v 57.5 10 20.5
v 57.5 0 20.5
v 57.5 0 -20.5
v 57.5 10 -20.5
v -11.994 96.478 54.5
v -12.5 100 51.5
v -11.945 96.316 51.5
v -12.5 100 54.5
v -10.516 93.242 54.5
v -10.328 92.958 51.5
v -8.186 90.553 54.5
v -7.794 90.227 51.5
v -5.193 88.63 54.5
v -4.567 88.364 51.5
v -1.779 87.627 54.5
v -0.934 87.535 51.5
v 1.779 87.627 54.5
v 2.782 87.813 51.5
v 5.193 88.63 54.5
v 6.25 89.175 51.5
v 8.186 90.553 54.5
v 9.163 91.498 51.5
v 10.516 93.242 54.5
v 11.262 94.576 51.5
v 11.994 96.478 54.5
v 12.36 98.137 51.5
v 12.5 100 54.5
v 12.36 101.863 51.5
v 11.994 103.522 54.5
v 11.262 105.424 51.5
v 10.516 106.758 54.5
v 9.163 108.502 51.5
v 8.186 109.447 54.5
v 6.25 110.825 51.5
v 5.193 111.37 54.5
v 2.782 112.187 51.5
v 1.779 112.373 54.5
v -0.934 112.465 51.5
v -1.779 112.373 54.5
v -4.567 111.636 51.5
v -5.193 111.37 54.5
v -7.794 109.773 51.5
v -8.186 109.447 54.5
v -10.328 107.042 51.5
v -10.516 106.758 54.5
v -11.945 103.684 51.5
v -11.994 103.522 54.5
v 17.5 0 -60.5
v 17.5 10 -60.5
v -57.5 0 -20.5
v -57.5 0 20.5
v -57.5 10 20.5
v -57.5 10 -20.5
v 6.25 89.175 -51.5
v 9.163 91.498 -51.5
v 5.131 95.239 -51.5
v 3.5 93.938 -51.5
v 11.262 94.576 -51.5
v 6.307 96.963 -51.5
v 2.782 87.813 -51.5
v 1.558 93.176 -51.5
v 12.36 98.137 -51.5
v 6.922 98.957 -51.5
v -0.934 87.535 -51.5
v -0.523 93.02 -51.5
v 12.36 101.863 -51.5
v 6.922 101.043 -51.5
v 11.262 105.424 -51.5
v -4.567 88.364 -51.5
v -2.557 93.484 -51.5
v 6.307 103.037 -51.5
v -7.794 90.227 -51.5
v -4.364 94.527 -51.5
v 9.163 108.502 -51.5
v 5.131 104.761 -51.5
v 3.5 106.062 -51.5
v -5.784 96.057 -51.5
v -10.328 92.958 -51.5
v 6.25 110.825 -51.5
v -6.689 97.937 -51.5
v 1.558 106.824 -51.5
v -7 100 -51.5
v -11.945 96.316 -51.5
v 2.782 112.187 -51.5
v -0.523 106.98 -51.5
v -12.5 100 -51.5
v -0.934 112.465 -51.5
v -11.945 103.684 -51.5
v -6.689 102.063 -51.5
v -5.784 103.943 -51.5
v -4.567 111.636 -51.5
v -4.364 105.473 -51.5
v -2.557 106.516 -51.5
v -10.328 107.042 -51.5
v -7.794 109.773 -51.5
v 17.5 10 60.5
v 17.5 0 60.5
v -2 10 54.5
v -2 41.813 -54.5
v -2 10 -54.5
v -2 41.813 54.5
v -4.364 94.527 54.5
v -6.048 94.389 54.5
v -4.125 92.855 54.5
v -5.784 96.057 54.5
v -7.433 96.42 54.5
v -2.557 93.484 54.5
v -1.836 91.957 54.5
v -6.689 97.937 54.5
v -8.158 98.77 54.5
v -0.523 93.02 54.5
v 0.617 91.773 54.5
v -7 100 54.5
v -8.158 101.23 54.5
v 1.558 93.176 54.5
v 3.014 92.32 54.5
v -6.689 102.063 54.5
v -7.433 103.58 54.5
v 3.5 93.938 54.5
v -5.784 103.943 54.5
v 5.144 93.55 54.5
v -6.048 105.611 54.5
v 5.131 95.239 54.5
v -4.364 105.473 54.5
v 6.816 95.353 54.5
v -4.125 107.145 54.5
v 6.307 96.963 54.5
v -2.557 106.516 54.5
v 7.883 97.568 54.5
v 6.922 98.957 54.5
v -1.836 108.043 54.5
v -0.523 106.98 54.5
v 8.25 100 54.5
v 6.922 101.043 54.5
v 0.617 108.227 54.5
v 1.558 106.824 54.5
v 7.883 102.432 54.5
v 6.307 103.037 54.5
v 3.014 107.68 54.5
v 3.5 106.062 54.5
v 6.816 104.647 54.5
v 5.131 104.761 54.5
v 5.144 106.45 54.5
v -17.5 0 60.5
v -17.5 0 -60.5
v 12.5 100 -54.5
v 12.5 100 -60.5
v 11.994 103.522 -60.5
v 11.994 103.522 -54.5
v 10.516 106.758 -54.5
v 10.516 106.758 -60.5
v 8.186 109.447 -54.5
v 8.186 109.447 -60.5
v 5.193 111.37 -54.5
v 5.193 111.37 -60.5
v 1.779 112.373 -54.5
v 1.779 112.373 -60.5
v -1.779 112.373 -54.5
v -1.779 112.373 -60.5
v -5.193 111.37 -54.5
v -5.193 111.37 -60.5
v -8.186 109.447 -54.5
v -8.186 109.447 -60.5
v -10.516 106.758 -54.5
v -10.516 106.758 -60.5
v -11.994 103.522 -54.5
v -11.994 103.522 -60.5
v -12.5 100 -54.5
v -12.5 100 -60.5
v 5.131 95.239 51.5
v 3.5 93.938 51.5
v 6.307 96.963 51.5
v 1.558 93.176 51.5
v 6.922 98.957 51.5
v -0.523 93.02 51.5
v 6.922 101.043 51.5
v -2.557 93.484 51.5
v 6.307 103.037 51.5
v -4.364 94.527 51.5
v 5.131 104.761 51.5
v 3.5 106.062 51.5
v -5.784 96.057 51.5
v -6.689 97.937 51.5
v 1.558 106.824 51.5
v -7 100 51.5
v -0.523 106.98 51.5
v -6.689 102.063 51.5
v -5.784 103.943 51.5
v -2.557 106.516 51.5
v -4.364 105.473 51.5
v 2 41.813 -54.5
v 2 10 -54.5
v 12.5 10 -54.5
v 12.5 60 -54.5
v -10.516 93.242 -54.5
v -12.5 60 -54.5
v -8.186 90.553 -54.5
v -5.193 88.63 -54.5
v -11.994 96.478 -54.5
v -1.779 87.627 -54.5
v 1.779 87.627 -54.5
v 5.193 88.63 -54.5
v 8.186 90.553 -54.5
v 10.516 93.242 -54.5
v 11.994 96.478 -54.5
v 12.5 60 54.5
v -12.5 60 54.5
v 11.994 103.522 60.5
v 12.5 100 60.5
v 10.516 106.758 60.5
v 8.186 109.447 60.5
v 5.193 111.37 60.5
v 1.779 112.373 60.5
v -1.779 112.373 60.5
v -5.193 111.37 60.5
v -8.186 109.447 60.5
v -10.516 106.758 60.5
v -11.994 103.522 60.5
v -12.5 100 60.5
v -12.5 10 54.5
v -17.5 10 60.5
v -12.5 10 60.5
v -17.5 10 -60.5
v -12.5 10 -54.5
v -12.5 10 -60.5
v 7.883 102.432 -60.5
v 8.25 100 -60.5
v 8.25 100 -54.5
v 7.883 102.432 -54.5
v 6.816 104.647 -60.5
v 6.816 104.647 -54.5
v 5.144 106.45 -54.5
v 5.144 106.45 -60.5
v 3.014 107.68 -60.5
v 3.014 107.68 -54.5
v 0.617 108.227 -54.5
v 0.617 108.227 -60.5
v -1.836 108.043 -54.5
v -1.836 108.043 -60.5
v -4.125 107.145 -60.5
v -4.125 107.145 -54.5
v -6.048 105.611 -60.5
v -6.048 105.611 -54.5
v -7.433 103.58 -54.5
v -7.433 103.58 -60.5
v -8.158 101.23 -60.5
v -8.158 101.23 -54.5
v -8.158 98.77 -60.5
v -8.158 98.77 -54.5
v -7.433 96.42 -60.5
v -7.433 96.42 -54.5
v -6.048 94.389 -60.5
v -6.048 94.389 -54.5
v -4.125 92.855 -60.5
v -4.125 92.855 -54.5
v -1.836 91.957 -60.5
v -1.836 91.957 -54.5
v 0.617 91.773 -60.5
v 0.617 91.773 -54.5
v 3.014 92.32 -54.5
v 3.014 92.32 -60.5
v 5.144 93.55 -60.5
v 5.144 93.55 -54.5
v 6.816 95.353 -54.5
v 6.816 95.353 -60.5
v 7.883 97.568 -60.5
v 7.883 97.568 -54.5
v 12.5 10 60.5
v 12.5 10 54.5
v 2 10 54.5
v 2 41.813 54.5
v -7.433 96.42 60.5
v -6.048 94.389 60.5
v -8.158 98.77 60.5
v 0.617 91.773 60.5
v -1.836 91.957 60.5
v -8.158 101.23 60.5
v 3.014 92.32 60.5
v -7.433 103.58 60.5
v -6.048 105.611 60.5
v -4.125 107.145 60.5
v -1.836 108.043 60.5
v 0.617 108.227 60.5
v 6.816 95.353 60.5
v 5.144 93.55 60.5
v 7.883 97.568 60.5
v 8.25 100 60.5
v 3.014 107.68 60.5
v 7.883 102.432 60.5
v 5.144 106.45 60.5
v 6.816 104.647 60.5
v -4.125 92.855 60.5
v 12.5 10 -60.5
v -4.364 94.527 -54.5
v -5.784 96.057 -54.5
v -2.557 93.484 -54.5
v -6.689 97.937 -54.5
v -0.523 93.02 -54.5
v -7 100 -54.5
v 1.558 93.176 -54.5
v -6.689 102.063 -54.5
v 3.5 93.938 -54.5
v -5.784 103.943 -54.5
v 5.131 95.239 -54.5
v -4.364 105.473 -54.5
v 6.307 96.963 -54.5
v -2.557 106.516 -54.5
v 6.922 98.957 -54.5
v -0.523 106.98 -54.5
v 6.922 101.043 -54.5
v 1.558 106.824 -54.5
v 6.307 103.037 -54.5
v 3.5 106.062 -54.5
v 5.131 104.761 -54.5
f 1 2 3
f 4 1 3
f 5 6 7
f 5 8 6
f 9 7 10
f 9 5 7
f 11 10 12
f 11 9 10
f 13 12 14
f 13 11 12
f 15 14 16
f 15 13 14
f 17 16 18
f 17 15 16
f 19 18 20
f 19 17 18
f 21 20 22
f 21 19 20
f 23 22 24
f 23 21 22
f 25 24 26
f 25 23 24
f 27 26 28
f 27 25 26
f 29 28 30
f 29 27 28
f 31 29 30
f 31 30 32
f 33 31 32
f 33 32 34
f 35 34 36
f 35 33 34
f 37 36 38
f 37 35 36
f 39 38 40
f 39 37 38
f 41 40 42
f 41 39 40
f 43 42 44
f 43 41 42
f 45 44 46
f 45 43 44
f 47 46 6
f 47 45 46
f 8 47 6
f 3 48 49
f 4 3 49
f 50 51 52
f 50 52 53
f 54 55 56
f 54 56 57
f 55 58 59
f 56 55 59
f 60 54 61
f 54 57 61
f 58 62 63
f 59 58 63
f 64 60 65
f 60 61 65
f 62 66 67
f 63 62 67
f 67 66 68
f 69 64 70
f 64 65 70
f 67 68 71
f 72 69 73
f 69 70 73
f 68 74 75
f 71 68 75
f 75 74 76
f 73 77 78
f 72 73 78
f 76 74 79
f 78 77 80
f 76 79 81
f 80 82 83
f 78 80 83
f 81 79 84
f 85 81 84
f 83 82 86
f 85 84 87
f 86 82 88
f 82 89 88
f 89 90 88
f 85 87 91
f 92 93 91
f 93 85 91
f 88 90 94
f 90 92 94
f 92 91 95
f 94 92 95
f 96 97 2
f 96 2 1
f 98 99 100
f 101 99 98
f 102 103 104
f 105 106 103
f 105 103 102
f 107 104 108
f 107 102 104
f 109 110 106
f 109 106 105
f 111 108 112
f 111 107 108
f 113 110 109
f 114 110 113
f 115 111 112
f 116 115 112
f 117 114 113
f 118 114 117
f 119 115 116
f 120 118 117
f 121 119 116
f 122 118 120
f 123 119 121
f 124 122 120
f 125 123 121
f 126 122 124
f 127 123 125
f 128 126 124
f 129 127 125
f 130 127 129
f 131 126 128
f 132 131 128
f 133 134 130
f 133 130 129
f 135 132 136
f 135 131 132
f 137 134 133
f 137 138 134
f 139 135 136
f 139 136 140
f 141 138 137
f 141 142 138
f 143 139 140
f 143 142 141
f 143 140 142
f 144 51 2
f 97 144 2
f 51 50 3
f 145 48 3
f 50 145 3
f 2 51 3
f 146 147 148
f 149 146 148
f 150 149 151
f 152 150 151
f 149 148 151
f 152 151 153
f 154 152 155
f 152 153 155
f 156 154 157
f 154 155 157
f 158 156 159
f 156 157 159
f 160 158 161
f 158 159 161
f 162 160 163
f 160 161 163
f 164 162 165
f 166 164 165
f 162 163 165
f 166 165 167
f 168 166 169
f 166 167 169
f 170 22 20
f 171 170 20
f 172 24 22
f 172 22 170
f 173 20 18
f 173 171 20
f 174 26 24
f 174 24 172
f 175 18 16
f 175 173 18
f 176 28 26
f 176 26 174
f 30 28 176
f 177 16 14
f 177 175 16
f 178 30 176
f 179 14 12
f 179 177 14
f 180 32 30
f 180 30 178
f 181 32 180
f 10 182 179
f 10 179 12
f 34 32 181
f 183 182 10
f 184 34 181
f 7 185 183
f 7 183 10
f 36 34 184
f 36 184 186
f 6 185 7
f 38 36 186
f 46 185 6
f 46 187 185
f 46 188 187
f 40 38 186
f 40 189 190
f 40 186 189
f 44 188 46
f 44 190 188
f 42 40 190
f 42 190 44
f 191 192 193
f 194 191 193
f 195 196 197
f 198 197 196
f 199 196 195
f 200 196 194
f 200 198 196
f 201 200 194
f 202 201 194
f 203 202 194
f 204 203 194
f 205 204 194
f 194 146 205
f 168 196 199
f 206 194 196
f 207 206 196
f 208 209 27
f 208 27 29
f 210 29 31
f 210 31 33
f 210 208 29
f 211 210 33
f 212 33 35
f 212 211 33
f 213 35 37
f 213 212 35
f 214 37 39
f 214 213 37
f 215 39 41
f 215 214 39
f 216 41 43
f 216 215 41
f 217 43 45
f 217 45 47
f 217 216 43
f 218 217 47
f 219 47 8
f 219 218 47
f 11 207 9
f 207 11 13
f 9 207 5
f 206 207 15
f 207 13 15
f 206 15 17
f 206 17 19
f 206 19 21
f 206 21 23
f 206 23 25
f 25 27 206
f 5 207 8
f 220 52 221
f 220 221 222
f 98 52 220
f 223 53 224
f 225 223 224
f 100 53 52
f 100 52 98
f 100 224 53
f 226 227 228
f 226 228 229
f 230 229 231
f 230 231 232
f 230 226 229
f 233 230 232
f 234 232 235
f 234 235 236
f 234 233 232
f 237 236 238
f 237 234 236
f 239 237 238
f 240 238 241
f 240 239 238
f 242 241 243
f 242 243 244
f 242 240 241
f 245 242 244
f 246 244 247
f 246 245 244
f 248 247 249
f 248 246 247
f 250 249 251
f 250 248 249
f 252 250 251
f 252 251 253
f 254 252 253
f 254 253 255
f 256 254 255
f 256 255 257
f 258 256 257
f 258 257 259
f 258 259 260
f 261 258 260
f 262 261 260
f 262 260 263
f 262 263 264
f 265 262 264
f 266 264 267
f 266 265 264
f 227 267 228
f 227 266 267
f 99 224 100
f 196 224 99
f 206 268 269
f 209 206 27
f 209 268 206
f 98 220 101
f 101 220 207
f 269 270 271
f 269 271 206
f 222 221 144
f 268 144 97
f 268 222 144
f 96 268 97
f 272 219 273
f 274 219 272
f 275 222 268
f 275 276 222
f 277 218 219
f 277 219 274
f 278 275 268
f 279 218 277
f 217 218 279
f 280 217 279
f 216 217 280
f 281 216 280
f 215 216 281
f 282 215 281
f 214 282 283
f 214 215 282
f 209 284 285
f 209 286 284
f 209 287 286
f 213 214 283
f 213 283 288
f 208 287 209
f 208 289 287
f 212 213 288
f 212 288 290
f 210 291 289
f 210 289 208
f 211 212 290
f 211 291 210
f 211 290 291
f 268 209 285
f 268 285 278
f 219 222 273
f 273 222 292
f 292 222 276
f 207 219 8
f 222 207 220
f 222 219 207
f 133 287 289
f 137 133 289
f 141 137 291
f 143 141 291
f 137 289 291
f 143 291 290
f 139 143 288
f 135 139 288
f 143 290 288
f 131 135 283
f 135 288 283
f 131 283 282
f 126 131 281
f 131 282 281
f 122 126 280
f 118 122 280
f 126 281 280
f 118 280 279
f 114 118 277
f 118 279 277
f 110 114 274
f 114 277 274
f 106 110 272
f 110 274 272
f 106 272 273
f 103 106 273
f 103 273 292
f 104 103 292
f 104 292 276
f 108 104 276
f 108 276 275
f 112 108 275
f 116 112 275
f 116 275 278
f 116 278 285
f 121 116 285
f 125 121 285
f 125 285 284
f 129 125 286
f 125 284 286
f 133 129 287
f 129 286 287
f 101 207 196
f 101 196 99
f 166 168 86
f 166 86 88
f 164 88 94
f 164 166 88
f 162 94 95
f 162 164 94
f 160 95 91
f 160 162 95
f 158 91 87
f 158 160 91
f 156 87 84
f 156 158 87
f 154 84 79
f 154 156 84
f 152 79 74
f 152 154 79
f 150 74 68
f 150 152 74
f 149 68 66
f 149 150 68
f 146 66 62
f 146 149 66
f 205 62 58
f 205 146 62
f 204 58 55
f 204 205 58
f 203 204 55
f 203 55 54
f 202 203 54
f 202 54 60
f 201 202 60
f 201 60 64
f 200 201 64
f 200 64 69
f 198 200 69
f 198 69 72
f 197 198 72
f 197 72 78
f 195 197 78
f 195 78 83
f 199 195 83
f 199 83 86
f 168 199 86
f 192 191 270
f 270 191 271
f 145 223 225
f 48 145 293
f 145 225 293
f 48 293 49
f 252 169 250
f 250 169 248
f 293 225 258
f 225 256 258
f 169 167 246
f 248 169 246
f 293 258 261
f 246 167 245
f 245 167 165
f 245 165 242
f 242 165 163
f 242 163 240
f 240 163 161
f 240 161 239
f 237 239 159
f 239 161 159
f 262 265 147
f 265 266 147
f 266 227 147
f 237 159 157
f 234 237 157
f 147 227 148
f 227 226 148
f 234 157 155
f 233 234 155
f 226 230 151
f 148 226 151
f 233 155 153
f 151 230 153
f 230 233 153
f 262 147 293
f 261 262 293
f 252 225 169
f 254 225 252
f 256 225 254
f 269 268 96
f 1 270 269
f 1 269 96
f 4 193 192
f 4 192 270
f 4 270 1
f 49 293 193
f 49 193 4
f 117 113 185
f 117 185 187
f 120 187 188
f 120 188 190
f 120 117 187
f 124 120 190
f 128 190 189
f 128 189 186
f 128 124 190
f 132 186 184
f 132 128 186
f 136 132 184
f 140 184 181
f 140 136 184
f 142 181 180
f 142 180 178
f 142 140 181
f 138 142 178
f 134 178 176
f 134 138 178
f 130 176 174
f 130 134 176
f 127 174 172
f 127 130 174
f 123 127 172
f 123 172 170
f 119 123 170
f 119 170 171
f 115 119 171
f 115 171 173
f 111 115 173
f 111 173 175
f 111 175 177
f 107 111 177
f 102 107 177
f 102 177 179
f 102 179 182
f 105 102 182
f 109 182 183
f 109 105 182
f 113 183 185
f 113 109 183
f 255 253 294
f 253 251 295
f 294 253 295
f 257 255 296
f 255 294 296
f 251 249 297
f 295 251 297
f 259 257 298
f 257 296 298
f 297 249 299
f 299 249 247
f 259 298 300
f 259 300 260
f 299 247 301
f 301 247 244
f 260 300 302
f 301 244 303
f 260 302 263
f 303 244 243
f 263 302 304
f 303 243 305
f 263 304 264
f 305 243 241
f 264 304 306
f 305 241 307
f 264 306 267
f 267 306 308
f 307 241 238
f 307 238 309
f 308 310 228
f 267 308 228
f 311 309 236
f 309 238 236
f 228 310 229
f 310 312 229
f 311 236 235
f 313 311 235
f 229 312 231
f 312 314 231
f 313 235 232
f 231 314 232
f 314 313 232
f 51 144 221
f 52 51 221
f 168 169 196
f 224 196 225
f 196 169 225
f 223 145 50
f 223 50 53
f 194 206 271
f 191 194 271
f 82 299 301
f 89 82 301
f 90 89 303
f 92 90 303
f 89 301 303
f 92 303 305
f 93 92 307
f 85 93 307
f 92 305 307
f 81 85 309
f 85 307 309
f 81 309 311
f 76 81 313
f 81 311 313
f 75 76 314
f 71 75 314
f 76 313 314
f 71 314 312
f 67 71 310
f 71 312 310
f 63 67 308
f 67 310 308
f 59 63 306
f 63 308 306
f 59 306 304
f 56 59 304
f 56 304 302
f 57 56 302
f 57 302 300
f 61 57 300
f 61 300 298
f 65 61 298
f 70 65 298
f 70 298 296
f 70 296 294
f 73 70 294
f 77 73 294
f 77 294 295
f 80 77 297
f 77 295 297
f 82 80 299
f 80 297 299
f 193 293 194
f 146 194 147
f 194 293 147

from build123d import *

# Parameters (mm, degrees)
SKETCH1_W           = 115
SKETCH1_H           = 121
BOSS_EXTRUDE1_DEPTH = 10
BOSS_EXTRUDE2_DEPTH = 6
SKETCH3_R           = 12.5
SKETCH3_R_2         = 7
BOSS_EXTRUDE3_DEPTH = 3
SKETCH4_R           = 8.25
CUT_EXTRUDE1_DEPTH  = 6
SKETCH6_W           = 54.5
SKETCH6_H           = 50
BOSS_EXTRUDE5_DEPTH = 2
BOSS_EXTRUDE6_REACH = 117
CHAMFER1_SIZE       = 40


with BuildPart() as part:
    # Sketch1 → Boss-Extrude1 (new body)
    with BuildSketch(Plane(origin=(0, 0, 0), x_dir=(1, 0, 0), z_dir=(0, 1, 0))):
        Rectangle(SKETCH1_W, SKETCH1_H)
    extrude(amount=BOSS_EXTRUDE1_DEPTH)

    # Sketch2 → Boss-Extrude2 (add)
    with BuildSketch(Plane.XY.offset(60.5)):
        with BuildLine():
            Line((-12.5, 100), (-12.5, 0))
            Line((-12.5, 0), (12.5, 0))
            Line((12.5, 0), (12.5, 100))
            ThreePointArc((12.5, 100), (0, 112.5), (-12.5, 100))
        make_face()
    boss_extrude2 = extrude(amount=-BOSS_EXTRUDE2_DEPTH)

    # Sketch3 → Boss-Extrude3 (add)
    with BuildSketch(Plane(origin=(0, 0, 54.5), x_dir=(-1, 0, 0), z_dir=(0, 0, -1))):
        with Locations((0, 100)):
            Circle(SKETCH3_R)
        with Locations((0, 100)):
            Circle(SKETCH3_R_2, mode=Mode.SUBTRACT)
    boss_extrude3 = extrude(amount=BOSS_EXTRUDE3_DEPTH)

    # Sketch4 → Cut-Extrude1 (cut)
    with BuildSketch(Plane.XY.offset(60.5)):
        with Locations((0, 100)):
            Circle(SKETCH4_R)
    cut_extrude1 = extrude(amount=-CUT_EXTRUDE1_DEPTH, mode=Mode.SUBTRACT)

    # Sketch6 → Boss-Extrude5 (add, symmetric)
    with BuildSketch(Plane(origin=(0, 0, 0), x_dir=(0, 0, -1), z_dir=(1, 0, 0))):
        with Locations((-27.25, 35)):
            Rectangle(SKETCH6_W, SKETCH6_H)
    boss_extrude5 = extrude(amount=BOSS_EXTRUDE5_DEPTH, both=True)

    # Mirror1: Boss-Extrude2, Boss-Extrude3, Cut-Extrude1, Boss-Extrude5 across plane
    add(boss_extrude2.mirror(Plane.XY))
    add(boss_extrude3.mirror(Plane.XY))
    add(cut_extrude1.mirror(Plane.XY), mode=Mode.SUBTRACT)
    add(boss_extrude5.mirror(Plane.XY))

    # Sketch7 → Boss-Extrude6 (add, up to next)
    with BuildSketch(Plane.XY.offset(-54.5), mode=Mode.PRIVATE) as boss_extrude6_sk1:
        Polygon((2, 60), (12.5, 60), (2, 41.813466521), align=None)
    boss_extrude6_tool1 = extrude(boss_extrude6_sk1.sketch, amount=BOSS_EXTRUDE6_REACH, mode=Mode.PRIVATE) - part.part
    add(boss_extrude6_tool1.solids().sort_by_distance((5.5, 53.937822, -54.5))[0])
    # Sketch7 → Boss-Extrude6 (add, up to next)
    with BuildSketch(Plane.XY.offset(-54.5), mode=Mode.PRIVATE) as boss_extrude6_sk2:
        Polygon((-2, 60), (-12.5, 60), (-2, 41.813466521), align=None)
    boss_extrude6_tool2 = extrude(boss_extrude6_sk2.sketch, amount=BOSS_EXTRUDE6_REACH, mode=Mode.PRIVATE) - part.part
    add(boss_extrude6_tool2.solids().sort_by_distance((-5.5, 53.937822, -54.5))[0])

    # Chamfer1
    chamfer1_edges = [part.edges().sort_by_distance(p)[0] for p in [
        (57.5, 5, 60.5),
        (-57.5, 5, 60.5),
        (-57.5, 5, -60.5),
        (57.5, 5, -60.5),
    ]]
    chamfer(chamfer1_edges, length=CHAMFER1_SIZE)


solid = part.part
